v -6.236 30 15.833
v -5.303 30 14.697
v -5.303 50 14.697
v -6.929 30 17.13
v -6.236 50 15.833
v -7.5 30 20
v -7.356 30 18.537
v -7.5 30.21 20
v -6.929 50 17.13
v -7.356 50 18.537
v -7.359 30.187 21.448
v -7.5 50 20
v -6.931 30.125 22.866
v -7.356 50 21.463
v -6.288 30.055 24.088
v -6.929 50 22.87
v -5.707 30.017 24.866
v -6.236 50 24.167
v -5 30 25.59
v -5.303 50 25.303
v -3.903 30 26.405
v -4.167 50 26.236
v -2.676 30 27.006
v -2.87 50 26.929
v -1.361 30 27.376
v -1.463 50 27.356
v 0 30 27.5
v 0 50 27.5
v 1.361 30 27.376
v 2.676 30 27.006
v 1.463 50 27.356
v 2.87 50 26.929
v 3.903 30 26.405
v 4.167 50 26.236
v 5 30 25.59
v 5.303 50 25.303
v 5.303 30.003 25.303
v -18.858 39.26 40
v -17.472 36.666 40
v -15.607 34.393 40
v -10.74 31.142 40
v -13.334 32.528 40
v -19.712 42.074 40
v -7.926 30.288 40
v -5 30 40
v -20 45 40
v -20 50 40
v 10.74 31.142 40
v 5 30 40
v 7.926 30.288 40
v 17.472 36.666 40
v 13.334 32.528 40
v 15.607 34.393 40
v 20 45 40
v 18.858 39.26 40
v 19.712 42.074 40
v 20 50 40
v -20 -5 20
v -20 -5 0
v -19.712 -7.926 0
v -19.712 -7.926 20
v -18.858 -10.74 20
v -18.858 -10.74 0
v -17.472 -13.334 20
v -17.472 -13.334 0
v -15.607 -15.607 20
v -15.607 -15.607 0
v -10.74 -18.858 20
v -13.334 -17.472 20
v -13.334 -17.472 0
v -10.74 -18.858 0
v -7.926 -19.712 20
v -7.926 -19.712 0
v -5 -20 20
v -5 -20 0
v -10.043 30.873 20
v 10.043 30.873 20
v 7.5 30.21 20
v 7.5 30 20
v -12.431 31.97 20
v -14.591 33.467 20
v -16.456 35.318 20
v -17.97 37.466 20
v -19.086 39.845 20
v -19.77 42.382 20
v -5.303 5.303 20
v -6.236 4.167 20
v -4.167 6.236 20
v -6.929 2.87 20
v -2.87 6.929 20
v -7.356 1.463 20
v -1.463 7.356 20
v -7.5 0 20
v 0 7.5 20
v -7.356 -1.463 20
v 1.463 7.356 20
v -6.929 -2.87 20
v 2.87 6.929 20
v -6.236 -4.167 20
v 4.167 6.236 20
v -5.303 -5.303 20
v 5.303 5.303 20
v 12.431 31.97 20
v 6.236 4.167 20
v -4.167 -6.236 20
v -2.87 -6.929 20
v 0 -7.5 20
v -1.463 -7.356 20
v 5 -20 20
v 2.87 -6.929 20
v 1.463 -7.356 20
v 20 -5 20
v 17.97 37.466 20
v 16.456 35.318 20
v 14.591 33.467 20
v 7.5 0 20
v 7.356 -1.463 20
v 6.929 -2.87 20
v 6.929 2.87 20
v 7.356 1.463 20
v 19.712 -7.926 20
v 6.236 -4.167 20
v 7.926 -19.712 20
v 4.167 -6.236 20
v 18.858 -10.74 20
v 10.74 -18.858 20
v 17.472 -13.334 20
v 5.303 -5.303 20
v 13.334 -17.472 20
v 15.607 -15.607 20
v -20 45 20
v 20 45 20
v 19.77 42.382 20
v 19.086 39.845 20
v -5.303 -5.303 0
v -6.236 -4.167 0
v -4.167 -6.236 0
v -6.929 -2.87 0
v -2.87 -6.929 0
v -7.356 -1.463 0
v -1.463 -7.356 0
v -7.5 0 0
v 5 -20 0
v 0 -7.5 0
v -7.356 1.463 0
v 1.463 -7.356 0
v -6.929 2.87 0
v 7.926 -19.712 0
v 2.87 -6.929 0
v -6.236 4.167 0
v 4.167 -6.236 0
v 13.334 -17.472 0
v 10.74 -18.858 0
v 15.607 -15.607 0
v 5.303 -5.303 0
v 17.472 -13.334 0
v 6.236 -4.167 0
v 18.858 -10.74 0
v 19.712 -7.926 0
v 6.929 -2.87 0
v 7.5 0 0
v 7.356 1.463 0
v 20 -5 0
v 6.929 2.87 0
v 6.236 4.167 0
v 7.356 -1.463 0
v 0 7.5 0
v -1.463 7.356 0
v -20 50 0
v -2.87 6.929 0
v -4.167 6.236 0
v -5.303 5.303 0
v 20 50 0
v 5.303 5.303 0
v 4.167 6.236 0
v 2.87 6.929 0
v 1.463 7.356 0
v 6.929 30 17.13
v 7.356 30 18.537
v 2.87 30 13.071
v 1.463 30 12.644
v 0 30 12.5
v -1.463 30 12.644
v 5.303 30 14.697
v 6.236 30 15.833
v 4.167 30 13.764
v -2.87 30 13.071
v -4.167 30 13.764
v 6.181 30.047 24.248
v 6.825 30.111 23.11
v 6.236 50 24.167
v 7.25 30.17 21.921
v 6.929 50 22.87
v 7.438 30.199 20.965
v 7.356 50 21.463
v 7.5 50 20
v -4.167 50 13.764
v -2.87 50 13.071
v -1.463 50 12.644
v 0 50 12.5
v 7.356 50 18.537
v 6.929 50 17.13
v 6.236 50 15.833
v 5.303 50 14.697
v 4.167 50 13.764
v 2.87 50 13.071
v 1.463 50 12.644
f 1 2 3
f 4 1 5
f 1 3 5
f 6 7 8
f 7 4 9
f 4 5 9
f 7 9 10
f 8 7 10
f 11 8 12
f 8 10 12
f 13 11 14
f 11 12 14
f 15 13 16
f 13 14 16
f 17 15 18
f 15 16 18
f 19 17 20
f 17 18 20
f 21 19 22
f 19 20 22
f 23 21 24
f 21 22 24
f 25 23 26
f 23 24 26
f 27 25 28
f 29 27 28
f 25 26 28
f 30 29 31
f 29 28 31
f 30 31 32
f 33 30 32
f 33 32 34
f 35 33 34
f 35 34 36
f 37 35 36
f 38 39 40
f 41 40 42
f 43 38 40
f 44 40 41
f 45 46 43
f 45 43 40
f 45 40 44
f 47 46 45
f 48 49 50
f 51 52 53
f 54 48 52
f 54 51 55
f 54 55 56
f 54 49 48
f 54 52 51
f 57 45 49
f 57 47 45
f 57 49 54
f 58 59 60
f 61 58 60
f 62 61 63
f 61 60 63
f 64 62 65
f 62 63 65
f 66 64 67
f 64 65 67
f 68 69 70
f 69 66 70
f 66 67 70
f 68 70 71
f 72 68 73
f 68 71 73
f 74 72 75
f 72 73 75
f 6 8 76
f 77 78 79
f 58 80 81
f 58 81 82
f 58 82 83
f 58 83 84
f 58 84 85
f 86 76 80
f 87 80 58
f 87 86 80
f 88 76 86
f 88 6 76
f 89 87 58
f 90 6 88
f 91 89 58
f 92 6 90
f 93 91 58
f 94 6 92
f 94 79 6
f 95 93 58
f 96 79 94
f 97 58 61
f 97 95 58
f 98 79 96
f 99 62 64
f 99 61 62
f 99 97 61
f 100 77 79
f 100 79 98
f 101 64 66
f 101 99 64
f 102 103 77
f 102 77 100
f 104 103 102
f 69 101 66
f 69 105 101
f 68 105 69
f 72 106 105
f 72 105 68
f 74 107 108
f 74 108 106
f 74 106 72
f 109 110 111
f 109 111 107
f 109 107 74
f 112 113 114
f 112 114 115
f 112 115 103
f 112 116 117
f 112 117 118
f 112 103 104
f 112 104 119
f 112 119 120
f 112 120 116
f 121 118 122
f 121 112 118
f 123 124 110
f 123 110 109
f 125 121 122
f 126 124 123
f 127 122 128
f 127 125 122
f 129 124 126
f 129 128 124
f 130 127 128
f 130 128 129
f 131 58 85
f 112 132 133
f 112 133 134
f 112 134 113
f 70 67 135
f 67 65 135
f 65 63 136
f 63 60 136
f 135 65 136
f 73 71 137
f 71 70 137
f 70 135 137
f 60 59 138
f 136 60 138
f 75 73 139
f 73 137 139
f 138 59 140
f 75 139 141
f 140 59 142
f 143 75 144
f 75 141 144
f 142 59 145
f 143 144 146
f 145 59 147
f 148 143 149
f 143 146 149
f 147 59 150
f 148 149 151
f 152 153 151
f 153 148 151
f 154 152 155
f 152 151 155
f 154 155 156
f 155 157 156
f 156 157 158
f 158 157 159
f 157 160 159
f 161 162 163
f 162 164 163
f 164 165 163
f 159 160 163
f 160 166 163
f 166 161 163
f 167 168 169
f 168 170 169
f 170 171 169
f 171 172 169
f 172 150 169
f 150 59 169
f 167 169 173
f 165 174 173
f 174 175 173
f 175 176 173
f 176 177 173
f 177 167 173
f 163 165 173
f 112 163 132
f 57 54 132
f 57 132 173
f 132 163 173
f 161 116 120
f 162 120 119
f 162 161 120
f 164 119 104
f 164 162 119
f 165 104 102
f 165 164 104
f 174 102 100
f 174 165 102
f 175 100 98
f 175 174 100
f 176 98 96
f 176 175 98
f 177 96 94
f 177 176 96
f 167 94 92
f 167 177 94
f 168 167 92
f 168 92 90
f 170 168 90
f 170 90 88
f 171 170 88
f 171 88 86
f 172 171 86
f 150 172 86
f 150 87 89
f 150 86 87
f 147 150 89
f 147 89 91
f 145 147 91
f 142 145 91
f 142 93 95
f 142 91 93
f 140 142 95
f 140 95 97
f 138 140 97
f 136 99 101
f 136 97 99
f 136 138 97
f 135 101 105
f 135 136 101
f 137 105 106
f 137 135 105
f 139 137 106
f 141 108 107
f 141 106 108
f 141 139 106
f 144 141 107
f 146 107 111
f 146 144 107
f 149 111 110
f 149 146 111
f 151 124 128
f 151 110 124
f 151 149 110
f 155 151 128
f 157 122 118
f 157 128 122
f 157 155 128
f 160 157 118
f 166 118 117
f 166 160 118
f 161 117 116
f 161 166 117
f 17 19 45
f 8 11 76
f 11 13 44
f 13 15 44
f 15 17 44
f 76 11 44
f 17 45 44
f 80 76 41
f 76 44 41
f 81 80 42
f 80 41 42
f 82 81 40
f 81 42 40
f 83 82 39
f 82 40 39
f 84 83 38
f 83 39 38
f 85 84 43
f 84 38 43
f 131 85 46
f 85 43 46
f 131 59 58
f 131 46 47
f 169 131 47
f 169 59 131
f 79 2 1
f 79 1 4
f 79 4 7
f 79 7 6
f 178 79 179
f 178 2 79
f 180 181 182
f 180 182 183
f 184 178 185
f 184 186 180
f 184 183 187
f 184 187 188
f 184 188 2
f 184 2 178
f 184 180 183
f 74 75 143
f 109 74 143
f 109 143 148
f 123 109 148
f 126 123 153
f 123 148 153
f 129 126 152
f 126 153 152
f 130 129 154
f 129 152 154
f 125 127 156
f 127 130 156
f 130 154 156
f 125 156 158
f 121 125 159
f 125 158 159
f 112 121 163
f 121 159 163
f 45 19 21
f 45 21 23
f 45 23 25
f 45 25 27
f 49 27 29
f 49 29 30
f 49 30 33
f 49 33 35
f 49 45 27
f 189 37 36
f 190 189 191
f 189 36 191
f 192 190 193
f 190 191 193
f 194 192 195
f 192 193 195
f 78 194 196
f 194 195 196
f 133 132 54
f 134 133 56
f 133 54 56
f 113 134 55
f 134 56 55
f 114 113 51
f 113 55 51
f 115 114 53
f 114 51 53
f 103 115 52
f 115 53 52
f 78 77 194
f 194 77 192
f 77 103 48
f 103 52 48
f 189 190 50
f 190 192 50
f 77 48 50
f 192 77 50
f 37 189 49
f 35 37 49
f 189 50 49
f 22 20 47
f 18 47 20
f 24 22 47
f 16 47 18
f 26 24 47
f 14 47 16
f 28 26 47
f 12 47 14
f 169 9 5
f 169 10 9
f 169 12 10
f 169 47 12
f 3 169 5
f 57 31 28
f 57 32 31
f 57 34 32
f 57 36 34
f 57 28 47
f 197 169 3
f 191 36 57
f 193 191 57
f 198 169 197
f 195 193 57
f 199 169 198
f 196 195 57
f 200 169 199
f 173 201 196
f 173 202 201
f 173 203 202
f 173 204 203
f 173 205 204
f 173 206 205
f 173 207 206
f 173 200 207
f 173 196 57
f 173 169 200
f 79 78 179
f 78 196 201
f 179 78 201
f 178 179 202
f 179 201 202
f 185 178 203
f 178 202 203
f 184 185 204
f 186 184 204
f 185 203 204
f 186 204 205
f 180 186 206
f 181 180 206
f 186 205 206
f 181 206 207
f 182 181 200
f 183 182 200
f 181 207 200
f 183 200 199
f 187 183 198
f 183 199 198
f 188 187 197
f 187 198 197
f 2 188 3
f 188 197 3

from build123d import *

# Parameters (mm, degrees)
SKETCH1_W           = 40
SKETCH1_H           = 70
SKETCH1_R           = 7.5
BOSS_EXTRUDE1_DEPTH = 40
CUT_EXTRUDE1_DEPTH  = 20
SKETCH3_W           = 40
SKETCH3_H           = 50
CUT_EXTRUDE2_DEPTH  = 20
FILLET1_R           = 15


with BuildPart() as part:
    # Sketch1 → Boss-Extrude1 (new body)
    with BuildSketch(Plane.XY):
        with Locations((0, 15)):
            Rectangle(SKETCH1_W, SKETCH1_H)
        Circle(SKETCH1_R, mode=Mode.SUBTRACT)
    extrude(amount=BOSS_EXTRUDE1_DEPTH)

    # Sketch2 → Cut-Extrude1 (cut)
    with BuildSketch(Plane(origin=(0, 50, 0), x_dir=(1, 0, 0), z_dir=(0, 1, 0))):
        with BuildLine():
            ThreePointArc((7.5, -20), (2.870125743, -13.070903506), (-5.303300859, -14.696699141))
            Line((-5.303300859, -14.696699141), (5.303300859, -25.303300859))
            ThreePointArc((5.303300859, -25.303300859), (6.929096494, -22.870125743), (7.5, -20))
        make_face()
        with BuildLine():
            Line((5.303300859, -25.303300859), (-5.303300859, -14.696699141))
            ThreePointArc((-5.303300859, -14.696699141), (-5.303300859, -25.303300859), (5.303300859, -25.303300859))
        make_face()
    extrude(amount=-CUT_EXTRUDE1_DEPTH, mode=Mode.SUBTRACT)

    # Sketch3 → Cut-Extrude2 (cut)
    with BuildSketch(Plane.XY.offset(40)):
        with Locations((0, 5)):
            Rectangle(SKETCH3_W, SKETCH3_H)
    extrude(amount=-CUT_EXTRUDE2_DEPTH, mode=Mode.SUBTRACT)

    # Fillet1
    # the kernel refuses this fillet: 15 mm, written as the material it takes off along each edge
    with BuildSketch(Plane(origin=(20, -20, -37.5), x_dir=(0, 1, 0), z_dir=(0, 0, 1))) as fillet1_piece_1:
        with BuildLine():
            CenterArc((FILLET1_R, FILLET1_R), FILLET1_R, 180, 90)
            Line((0, FILLET1_R), (0, 0))
            Line((0, 0), (FILLET1_R, 0))
        make_face()
    extrude(amount=95, mode=Mode.SUBTRACT)
    with BuildSketch(Plane(origin=(-20, -20, -37.5), x_dir=(0, 1, 0), z_dir=(0, 0, 1))) as fillet1_piece_2:
        with BuildLine():
            CenterArc((FILLET1_R, -FILLET1_R), FILLET1_R, 90, 90)
            Line((0, -FILLET1_R), (0, 0))
            Line((0, 0), (FILLET1_R, 0))
        make_face()
    extrude(amount=95, mode=Mode.SUBTRACT)
    with BuildSketch(Plane(origin=(-20, 30, 77.5), x_dir=(0, 1, 0), z_dir=(0, 0, -1))) as fillet1_piece_3:
        with BuildLine():
            CenterArc((FILLET1_R, FILLET1_R), FILLET1_R, 180, 90)
            Line((0, FILLET1_R), (0, 0))
            Line((0, 0), (FILLET1_R, 0))
        make_face()
    extrude(amount=57.5, mode=Mode.SUBTRACT)
    with BuildSketch(Plane(origin=(20, 30, 77.5), x_dir=(0, 1, 0), z_dir=(0, 0, -1))) as fillet1_piece_4:
        with BuildLine():
            CenterArc((FILLET1_R, -FILLET1_R), FILLET1_R, 90, 90)
            Line((0, -FILLET1_R), (0, 0))
            Line((0, 0), (FILLET1_R, 0))
        make_face()
    extrude(amount=57.5, mode=Mode.SUBTRACT)


solid = part.part
